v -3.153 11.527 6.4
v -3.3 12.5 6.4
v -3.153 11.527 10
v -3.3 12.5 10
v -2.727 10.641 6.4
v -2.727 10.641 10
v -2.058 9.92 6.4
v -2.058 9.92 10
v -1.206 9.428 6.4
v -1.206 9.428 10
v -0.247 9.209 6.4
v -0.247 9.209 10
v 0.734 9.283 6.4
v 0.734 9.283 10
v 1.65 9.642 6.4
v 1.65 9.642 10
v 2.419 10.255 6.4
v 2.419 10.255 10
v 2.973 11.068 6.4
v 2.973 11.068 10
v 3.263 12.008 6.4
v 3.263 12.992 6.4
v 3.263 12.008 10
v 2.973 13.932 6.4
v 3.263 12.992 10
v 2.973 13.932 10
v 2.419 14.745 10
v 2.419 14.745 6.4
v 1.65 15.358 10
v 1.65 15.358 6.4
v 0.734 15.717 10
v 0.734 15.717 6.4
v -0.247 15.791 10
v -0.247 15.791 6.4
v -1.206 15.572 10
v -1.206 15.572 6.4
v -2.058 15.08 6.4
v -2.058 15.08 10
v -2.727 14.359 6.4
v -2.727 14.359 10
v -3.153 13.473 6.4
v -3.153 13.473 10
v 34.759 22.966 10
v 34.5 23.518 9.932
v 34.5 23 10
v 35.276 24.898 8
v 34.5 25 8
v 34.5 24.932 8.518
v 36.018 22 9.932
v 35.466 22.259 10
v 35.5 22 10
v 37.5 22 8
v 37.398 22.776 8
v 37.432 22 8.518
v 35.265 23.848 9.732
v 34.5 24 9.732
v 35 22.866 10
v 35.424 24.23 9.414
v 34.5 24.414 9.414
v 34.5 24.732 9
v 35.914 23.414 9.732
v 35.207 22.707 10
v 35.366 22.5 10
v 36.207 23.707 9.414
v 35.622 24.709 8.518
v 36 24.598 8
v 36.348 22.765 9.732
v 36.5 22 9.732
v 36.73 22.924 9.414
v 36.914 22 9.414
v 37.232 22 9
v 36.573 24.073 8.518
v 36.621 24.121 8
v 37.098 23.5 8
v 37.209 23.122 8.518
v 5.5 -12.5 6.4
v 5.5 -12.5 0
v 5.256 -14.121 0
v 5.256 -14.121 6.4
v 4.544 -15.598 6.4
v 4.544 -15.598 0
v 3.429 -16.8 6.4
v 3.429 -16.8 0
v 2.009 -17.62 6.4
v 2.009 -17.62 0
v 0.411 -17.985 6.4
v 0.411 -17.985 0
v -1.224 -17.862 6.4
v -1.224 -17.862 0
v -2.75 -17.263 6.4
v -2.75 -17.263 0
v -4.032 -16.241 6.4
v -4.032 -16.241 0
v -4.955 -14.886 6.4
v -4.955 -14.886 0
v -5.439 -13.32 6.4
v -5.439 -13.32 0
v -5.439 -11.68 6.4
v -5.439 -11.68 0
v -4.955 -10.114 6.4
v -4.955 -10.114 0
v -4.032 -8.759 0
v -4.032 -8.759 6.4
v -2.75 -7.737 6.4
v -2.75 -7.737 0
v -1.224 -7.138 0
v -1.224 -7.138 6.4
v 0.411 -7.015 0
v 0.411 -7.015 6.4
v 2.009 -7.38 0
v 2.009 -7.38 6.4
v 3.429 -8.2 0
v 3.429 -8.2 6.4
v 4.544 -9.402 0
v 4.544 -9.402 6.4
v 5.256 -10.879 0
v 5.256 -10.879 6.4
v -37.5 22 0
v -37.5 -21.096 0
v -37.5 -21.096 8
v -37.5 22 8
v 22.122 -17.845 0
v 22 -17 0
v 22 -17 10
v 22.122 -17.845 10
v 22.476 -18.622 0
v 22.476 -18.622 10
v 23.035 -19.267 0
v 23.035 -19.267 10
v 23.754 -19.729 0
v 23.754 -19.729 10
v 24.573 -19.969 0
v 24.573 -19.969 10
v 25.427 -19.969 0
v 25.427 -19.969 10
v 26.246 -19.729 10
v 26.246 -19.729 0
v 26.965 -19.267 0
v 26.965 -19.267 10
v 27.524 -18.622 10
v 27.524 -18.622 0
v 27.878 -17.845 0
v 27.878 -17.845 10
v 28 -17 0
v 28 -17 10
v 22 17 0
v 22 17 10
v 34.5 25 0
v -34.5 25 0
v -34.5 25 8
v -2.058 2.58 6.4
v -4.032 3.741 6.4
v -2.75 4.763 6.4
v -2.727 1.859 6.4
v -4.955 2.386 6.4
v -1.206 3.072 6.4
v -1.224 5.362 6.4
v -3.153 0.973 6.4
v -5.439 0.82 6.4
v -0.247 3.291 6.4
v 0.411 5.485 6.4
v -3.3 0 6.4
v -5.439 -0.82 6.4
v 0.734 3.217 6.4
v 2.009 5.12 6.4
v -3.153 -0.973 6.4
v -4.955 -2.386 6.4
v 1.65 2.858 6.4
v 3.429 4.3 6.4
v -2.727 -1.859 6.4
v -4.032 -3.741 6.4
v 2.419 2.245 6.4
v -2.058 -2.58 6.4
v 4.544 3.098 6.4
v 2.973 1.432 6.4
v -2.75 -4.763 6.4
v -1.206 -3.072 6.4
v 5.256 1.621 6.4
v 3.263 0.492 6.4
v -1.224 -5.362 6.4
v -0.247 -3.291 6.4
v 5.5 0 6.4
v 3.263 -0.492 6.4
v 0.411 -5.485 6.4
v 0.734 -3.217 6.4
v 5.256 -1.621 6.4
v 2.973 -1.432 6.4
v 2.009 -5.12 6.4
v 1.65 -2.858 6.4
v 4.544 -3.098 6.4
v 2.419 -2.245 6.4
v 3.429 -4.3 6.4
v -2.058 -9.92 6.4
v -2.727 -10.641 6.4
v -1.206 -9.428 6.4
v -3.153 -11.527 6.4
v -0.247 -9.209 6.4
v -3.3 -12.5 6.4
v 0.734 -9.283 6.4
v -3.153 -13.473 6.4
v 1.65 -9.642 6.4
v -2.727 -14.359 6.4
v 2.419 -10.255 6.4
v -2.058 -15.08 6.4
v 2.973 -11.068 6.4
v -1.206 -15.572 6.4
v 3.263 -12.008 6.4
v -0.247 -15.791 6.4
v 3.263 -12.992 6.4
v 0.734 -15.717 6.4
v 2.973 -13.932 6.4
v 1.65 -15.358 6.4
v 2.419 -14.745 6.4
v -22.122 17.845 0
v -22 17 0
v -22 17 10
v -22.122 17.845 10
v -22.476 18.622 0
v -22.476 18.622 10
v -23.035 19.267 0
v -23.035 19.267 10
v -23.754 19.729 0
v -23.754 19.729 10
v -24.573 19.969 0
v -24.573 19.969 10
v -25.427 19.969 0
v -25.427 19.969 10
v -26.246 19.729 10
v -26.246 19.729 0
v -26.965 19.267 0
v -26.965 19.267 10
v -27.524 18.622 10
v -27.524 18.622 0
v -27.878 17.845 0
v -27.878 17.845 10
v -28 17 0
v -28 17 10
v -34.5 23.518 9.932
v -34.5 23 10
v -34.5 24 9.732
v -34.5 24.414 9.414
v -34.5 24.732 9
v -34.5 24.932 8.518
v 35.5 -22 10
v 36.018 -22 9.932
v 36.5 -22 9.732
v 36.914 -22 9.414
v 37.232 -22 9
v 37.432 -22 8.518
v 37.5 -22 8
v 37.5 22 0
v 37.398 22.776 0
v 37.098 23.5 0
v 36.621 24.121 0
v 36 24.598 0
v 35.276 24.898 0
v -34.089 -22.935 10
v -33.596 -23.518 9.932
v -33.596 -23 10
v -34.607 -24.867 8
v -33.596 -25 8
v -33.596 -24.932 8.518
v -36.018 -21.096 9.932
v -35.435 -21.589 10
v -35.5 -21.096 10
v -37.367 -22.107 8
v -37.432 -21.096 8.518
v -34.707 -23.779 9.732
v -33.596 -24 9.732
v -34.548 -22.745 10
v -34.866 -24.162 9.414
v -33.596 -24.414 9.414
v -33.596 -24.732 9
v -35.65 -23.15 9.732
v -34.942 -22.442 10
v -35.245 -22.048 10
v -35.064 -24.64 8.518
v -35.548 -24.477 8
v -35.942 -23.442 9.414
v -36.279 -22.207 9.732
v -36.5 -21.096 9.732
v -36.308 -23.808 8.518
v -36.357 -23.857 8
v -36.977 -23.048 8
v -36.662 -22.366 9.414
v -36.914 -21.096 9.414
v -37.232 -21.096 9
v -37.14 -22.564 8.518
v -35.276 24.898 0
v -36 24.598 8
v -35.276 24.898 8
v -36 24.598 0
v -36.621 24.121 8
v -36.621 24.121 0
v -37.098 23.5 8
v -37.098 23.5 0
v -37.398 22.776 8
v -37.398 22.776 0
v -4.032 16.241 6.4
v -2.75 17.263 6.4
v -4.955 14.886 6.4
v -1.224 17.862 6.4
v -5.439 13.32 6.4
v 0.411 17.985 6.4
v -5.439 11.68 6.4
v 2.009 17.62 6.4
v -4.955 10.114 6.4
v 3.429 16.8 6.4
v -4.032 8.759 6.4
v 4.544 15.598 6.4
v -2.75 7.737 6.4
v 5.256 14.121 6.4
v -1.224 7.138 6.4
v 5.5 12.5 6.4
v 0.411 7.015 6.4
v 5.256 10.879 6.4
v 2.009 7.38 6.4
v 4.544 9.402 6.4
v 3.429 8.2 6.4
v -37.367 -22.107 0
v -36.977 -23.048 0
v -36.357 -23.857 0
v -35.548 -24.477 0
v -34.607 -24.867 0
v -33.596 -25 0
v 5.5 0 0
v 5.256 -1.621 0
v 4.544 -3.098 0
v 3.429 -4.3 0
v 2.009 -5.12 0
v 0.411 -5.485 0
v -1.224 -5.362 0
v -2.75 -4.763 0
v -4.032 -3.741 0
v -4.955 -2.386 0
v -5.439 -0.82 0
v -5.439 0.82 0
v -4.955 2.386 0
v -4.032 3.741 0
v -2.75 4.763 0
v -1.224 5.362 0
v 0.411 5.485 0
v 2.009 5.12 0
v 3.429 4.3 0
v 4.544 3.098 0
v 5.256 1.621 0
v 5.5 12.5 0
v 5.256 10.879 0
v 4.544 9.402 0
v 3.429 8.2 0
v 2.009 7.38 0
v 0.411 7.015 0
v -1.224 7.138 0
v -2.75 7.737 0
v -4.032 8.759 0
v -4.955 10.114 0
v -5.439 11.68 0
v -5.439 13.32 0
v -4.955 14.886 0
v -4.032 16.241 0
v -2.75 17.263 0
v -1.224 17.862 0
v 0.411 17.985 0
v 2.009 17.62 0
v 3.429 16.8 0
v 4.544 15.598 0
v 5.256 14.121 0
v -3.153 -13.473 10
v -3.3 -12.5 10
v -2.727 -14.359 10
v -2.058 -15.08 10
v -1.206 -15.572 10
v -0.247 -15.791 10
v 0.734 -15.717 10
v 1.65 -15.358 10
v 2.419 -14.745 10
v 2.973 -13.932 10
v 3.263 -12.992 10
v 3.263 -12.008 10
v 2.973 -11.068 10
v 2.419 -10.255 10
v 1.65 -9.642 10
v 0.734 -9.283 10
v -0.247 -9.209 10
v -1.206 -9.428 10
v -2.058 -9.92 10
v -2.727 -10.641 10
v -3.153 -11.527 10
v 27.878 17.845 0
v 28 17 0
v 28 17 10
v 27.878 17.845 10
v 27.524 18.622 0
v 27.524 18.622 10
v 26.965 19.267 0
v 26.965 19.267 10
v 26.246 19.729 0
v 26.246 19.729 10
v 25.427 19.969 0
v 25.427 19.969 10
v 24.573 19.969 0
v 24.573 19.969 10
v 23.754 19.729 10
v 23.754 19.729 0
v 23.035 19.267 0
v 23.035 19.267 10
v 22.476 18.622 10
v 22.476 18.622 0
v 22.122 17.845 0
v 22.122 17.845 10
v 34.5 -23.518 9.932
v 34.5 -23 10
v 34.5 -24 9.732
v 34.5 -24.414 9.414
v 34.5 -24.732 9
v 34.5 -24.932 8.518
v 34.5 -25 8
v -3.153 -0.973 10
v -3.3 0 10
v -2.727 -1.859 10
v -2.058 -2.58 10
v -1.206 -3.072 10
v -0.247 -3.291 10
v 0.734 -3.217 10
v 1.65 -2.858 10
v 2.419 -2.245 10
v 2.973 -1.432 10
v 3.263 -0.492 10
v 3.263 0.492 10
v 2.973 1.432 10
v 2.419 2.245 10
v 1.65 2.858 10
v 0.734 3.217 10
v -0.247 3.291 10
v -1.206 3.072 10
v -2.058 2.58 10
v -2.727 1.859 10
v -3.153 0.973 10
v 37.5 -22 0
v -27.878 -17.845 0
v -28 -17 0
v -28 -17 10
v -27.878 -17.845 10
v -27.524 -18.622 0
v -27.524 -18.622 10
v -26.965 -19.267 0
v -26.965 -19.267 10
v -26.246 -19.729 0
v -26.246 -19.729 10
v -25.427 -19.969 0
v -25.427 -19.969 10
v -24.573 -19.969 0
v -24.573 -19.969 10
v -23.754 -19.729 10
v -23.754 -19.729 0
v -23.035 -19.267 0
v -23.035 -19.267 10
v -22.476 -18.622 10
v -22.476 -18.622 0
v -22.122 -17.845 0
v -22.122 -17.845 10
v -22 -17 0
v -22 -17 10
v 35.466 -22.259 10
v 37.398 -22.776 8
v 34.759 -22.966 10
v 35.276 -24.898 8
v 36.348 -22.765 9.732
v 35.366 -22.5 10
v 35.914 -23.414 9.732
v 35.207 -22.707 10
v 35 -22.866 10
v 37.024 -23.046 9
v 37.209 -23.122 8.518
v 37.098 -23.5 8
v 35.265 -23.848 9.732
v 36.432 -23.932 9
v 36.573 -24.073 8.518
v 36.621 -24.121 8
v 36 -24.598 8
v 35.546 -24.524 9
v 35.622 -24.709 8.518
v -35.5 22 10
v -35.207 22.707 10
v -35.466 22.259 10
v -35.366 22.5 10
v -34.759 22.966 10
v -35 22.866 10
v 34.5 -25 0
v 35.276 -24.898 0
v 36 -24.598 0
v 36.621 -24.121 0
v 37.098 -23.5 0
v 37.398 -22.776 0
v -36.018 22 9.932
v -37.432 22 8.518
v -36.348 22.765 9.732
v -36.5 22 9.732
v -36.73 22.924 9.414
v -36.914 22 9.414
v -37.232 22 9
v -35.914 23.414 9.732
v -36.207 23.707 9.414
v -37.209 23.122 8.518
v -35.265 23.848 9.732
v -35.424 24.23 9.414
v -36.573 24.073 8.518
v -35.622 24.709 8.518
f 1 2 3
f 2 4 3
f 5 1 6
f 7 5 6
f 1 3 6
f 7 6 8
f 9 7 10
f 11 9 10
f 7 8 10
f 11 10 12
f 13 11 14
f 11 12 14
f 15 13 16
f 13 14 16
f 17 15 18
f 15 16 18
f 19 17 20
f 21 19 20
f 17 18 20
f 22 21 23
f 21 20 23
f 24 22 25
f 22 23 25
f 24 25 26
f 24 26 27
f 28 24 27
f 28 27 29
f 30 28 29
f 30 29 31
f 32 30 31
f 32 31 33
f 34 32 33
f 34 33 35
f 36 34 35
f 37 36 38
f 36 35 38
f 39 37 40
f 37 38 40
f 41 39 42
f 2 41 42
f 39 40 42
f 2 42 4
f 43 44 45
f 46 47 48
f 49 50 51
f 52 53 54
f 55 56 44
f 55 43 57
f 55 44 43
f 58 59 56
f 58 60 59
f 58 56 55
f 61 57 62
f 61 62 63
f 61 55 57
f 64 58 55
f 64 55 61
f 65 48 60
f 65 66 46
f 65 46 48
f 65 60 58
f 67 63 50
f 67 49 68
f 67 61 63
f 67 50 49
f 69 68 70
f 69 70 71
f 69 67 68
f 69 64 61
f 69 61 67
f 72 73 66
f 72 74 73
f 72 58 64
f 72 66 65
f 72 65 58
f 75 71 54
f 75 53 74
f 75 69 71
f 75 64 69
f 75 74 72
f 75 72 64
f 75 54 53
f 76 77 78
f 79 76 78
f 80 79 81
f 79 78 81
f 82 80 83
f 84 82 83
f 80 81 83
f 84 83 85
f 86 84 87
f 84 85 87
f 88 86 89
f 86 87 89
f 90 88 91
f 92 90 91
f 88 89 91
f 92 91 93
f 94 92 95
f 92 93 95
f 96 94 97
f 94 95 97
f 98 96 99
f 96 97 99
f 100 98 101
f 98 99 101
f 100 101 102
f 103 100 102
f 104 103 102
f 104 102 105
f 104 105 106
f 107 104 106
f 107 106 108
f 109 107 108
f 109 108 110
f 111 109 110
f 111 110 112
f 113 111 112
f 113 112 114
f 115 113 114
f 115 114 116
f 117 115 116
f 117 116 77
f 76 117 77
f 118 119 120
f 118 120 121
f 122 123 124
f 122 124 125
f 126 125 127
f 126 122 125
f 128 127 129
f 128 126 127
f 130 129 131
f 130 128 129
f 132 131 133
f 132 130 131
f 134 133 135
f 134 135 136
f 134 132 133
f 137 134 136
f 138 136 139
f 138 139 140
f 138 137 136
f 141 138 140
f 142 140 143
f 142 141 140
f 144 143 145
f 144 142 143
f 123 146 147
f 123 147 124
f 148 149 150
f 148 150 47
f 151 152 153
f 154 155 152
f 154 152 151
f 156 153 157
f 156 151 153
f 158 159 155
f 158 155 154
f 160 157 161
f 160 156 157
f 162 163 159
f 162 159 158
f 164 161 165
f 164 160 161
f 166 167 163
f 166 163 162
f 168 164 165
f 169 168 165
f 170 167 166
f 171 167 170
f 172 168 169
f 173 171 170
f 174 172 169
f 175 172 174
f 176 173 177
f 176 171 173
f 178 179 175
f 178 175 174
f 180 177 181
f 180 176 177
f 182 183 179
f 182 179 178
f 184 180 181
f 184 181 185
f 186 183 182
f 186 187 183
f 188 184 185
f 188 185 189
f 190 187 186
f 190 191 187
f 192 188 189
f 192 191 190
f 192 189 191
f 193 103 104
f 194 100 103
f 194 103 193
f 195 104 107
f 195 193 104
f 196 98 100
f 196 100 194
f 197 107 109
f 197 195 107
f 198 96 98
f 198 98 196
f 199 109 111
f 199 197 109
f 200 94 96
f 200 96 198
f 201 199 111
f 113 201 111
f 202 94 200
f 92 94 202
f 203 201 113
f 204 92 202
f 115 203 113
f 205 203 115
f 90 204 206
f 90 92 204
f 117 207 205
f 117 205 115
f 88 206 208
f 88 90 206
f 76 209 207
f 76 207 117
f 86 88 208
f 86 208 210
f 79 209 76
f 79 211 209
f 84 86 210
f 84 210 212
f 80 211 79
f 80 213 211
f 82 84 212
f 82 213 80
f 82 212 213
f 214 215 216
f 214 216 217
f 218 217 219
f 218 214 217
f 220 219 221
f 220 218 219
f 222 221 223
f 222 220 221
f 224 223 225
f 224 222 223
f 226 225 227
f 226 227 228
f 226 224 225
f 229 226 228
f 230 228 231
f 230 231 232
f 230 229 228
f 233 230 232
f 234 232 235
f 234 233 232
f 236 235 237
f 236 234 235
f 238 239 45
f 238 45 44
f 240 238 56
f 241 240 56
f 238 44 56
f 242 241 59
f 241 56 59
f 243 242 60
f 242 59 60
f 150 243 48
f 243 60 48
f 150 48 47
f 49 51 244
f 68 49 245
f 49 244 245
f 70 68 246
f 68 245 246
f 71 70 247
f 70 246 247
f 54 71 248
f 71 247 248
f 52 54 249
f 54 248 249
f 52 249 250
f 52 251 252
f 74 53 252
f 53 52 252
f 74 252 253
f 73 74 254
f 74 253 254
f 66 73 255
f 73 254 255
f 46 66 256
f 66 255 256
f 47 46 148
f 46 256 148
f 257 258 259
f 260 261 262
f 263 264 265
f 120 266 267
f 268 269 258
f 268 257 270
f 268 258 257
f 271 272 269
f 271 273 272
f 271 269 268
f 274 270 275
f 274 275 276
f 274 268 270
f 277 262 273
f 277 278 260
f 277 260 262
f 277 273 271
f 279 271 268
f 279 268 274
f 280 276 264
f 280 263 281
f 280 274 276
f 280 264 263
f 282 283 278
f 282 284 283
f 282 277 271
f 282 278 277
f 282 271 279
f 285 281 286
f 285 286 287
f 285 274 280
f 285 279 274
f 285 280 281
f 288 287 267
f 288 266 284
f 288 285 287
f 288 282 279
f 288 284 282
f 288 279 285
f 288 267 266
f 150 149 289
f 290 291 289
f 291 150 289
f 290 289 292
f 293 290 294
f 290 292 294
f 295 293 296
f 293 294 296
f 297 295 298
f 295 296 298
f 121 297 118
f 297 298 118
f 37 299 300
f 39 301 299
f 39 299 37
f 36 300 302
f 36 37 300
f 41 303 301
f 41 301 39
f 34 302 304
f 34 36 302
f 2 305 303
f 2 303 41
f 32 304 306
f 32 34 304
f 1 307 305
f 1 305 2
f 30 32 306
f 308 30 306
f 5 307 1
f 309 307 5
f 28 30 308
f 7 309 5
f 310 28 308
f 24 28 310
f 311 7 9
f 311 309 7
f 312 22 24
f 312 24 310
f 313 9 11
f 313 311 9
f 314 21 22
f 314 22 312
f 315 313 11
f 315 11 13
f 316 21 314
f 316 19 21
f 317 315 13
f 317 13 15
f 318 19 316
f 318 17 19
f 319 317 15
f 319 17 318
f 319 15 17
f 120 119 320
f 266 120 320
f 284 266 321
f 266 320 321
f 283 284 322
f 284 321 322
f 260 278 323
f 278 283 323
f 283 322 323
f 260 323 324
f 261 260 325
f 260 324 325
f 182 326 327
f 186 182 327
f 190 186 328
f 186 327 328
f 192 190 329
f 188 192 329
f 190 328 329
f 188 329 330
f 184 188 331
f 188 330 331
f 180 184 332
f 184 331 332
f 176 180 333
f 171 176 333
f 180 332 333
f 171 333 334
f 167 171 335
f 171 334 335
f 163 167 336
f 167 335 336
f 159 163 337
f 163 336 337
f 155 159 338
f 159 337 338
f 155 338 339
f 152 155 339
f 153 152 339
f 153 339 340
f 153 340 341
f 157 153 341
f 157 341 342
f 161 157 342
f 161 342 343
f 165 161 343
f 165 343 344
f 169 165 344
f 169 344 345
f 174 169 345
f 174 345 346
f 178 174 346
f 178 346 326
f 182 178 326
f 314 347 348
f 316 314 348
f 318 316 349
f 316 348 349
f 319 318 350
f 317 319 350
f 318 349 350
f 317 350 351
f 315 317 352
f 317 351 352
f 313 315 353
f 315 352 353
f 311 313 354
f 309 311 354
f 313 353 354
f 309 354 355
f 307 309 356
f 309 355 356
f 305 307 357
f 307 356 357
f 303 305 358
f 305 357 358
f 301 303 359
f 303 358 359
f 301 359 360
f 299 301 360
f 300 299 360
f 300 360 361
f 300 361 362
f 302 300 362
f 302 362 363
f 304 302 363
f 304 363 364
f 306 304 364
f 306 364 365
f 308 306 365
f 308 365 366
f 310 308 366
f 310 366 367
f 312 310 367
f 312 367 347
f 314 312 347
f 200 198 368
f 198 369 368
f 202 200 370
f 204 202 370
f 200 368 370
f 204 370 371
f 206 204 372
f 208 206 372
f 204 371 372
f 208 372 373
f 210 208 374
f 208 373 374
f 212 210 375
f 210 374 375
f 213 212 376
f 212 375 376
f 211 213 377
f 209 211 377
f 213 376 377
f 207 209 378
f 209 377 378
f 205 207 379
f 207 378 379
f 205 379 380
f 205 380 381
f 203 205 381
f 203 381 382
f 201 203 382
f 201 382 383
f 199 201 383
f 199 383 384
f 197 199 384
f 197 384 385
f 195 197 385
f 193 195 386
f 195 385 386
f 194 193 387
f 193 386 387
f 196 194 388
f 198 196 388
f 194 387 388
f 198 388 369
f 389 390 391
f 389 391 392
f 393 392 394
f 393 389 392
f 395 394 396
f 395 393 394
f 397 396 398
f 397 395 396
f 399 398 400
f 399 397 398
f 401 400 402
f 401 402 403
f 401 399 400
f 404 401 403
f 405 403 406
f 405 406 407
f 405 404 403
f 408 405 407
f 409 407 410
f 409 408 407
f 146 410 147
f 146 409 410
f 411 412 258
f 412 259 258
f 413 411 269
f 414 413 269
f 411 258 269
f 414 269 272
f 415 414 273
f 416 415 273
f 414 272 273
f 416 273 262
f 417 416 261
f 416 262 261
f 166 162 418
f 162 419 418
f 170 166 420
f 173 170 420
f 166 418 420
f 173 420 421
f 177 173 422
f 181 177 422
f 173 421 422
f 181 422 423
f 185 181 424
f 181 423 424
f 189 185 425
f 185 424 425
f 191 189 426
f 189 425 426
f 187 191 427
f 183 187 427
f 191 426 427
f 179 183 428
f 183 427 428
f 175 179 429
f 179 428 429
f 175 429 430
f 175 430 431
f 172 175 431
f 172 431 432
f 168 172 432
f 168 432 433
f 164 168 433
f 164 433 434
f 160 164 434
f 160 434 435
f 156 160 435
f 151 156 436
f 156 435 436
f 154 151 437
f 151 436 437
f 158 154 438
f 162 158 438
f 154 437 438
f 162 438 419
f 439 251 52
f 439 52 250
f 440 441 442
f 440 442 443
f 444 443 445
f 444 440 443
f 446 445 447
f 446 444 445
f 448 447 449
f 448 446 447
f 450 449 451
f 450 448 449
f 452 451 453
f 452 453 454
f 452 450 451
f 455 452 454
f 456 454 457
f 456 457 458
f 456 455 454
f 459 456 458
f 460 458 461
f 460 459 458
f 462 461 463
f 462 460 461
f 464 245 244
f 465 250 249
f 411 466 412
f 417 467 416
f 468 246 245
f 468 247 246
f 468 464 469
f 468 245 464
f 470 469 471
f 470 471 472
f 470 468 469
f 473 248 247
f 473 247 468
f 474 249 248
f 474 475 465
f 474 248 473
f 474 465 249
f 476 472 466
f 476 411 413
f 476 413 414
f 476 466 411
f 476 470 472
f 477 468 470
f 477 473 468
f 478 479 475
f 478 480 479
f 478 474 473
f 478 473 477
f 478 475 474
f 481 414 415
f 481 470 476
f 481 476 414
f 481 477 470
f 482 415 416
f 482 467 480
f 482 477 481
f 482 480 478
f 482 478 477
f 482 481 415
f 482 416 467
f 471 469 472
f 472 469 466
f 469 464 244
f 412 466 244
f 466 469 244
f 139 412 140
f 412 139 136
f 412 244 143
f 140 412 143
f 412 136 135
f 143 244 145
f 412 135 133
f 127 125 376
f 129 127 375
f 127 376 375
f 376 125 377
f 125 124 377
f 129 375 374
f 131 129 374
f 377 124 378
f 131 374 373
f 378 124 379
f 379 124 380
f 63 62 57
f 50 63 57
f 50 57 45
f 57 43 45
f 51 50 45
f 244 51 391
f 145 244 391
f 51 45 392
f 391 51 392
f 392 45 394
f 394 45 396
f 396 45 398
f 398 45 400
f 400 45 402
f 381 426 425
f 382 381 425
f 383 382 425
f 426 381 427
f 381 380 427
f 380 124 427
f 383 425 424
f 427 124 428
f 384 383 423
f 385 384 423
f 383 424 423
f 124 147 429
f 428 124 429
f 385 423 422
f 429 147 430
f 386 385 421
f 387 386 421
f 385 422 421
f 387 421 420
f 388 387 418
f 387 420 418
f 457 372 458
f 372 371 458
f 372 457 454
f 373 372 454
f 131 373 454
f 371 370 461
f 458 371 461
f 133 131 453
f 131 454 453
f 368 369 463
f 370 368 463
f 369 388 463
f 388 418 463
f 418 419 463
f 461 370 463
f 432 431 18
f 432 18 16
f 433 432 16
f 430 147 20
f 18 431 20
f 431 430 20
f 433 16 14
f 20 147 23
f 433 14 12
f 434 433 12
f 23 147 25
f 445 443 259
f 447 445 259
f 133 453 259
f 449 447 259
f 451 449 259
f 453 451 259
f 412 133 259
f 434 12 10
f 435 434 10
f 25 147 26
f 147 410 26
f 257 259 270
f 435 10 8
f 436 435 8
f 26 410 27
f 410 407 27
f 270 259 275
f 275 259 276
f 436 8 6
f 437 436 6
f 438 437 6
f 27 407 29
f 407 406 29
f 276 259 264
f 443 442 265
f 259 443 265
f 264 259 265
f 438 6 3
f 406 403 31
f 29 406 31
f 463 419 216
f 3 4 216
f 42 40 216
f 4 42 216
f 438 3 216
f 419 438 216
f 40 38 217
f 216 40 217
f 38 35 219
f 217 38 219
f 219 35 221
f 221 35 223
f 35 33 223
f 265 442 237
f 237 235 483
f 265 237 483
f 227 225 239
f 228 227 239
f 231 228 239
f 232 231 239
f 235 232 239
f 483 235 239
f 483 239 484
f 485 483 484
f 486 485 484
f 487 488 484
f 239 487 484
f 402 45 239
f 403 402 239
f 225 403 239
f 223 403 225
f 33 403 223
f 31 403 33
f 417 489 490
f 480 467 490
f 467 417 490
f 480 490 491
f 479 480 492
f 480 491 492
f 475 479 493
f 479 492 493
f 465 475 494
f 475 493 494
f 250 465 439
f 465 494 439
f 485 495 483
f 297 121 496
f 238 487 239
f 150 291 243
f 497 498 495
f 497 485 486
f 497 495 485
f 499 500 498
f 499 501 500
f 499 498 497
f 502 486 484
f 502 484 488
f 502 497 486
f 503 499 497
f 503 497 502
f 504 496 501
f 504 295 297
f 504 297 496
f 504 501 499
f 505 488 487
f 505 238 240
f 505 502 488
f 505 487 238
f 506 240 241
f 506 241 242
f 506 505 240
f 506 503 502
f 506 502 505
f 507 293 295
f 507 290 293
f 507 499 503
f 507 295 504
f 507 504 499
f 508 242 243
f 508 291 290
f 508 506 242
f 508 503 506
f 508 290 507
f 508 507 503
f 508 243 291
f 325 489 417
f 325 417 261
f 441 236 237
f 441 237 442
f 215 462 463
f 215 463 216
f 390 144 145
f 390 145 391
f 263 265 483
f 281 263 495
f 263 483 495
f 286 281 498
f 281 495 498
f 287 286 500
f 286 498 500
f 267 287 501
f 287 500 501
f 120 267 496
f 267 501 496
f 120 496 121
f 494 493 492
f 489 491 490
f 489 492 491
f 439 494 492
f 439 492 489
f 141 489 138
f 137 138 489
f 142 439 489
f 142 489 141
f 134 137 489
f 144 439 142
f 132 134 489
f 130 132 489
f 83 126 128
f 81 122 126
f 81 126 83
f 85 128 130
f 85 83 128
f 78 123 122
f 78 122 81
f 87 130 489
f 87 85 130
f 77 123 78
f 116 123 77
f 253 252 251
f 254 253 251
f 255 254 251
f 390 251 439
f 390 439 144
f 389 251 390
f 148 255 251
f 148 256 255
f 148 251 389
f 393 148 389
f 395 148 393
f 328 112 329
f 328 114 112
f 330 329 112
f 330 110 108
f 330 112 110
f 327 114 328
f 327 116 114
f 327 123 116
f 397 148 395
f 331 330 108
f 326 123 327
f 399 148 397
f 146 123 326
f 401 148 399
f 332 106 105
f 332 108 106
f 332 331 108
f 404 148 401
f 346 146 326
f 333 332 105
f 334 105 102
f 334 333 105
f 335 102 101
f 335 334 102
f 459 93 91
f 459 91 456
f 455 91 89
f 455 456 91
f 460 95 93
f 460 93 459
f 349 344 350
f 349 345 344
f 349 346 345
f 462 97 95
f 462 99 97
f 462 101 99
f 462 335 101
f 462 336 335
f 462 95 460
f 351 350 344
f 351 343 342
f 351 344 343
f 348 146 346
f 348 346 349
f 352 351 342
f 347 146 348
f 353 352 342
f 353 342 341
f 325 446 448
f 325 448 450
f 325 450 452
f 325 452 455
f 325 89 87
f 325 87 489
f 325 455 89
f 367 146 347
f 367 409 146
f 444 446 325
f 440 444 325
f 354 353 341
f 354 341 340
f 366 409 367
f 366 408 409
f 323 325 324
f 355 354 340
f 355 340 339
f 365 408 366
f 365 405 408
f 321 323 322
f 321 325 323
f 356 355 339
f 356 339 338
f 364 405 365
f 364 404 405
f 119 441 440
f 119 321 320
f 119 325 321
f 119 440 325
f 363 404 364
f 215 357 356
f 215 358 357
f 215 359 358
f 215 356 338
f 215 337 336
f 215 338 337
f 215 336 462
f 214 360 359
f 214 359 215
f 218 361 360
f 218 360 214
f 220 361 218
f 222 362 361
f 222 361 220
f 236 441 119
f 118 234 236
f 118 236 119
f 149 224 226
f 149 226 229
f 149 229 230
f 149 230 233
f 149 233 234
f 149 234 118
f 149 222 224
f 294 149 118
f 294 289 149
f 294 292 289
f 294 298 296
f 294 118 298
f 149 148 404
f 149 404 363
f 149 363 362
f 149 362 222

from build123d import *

# Parameters (mm, degrees)
PAD_DEPTH        = 10
HOLE_D           = 6.6
HOLE_DEPTH       = 25
HOLE_CBORE_D     = 11
HOLE_CBORE_DEPTH = 6.4
FILLET_R         = 2


with BuildPart() as part:
    # Sketch → Pad (new body)
    with BuildSketch(Plane.XY):
        with BuildLine():
            Line((-34.5, 25), (34.5, 25))
            ThreePointArc((37.5, 22), (36.62132, 24.12132), (34.5, 25))
            Line((37.5, 22), (37.5, -22))
            ThreePointArc((34.5, -25), (36.62132, -24.12132), (37.5, -22))
            Line((34.5, -25), (-33.596236, -25))
            ThreePointArc((-37.5, -21.096236), (-36.356614, -23.856614), (-33.596236, -25))
            Line((-37.5, -21.096236), (-37.5, 22))
            ThreePointArc((-34.5, 25), (-36.62132, 24.12132), (-37.5, 22))
        make_face()
        with BuildLine():
            ThreePointArc((-22, 17), (-25, 20), (-28, 17))
            Line((-28, 17), (-28, -17))
            ThreePointArc((-28, -17), (-25, -20), (-22, -17))
            Line((-22, -17), (-22, 17))
        make_face(mode=Mode.SUBTRACT)
        with BuildLine():
            ThreePointArc((28, 17), (25, 20), (22, 17))
            Line((22, 17), (22, -17))
            ThreePointArc((22, -17), (25, -20), (28, -17))
            Line((28, -17), (28, 17))
        make_face(mode=Mode.SUBTRACT)
    extrude(amount=PAD_DEPTH)

    # Hole
    with Locations(Plane(origin=(0, 0, 0), x_dir=(1, 0, 0), z_dir=(0, 0, -1))):
        with Locations((0, 0), (0, 12.5), (0, -12.5)):
            CounterBoreHole(HOLE_D / 2, HOLE_CBORE_D / 2, HOLE_CBORE_DEPTH, depth=HOLE_DEPTH)

    # Fillet
    fillet_edges = [part.edges().sort_by_distance(p)[0] for p in [
        (0.451882, -25, 10),
    ]]
    fillet(fillet_edges, radius=FILLET_R)


solid = part.part
